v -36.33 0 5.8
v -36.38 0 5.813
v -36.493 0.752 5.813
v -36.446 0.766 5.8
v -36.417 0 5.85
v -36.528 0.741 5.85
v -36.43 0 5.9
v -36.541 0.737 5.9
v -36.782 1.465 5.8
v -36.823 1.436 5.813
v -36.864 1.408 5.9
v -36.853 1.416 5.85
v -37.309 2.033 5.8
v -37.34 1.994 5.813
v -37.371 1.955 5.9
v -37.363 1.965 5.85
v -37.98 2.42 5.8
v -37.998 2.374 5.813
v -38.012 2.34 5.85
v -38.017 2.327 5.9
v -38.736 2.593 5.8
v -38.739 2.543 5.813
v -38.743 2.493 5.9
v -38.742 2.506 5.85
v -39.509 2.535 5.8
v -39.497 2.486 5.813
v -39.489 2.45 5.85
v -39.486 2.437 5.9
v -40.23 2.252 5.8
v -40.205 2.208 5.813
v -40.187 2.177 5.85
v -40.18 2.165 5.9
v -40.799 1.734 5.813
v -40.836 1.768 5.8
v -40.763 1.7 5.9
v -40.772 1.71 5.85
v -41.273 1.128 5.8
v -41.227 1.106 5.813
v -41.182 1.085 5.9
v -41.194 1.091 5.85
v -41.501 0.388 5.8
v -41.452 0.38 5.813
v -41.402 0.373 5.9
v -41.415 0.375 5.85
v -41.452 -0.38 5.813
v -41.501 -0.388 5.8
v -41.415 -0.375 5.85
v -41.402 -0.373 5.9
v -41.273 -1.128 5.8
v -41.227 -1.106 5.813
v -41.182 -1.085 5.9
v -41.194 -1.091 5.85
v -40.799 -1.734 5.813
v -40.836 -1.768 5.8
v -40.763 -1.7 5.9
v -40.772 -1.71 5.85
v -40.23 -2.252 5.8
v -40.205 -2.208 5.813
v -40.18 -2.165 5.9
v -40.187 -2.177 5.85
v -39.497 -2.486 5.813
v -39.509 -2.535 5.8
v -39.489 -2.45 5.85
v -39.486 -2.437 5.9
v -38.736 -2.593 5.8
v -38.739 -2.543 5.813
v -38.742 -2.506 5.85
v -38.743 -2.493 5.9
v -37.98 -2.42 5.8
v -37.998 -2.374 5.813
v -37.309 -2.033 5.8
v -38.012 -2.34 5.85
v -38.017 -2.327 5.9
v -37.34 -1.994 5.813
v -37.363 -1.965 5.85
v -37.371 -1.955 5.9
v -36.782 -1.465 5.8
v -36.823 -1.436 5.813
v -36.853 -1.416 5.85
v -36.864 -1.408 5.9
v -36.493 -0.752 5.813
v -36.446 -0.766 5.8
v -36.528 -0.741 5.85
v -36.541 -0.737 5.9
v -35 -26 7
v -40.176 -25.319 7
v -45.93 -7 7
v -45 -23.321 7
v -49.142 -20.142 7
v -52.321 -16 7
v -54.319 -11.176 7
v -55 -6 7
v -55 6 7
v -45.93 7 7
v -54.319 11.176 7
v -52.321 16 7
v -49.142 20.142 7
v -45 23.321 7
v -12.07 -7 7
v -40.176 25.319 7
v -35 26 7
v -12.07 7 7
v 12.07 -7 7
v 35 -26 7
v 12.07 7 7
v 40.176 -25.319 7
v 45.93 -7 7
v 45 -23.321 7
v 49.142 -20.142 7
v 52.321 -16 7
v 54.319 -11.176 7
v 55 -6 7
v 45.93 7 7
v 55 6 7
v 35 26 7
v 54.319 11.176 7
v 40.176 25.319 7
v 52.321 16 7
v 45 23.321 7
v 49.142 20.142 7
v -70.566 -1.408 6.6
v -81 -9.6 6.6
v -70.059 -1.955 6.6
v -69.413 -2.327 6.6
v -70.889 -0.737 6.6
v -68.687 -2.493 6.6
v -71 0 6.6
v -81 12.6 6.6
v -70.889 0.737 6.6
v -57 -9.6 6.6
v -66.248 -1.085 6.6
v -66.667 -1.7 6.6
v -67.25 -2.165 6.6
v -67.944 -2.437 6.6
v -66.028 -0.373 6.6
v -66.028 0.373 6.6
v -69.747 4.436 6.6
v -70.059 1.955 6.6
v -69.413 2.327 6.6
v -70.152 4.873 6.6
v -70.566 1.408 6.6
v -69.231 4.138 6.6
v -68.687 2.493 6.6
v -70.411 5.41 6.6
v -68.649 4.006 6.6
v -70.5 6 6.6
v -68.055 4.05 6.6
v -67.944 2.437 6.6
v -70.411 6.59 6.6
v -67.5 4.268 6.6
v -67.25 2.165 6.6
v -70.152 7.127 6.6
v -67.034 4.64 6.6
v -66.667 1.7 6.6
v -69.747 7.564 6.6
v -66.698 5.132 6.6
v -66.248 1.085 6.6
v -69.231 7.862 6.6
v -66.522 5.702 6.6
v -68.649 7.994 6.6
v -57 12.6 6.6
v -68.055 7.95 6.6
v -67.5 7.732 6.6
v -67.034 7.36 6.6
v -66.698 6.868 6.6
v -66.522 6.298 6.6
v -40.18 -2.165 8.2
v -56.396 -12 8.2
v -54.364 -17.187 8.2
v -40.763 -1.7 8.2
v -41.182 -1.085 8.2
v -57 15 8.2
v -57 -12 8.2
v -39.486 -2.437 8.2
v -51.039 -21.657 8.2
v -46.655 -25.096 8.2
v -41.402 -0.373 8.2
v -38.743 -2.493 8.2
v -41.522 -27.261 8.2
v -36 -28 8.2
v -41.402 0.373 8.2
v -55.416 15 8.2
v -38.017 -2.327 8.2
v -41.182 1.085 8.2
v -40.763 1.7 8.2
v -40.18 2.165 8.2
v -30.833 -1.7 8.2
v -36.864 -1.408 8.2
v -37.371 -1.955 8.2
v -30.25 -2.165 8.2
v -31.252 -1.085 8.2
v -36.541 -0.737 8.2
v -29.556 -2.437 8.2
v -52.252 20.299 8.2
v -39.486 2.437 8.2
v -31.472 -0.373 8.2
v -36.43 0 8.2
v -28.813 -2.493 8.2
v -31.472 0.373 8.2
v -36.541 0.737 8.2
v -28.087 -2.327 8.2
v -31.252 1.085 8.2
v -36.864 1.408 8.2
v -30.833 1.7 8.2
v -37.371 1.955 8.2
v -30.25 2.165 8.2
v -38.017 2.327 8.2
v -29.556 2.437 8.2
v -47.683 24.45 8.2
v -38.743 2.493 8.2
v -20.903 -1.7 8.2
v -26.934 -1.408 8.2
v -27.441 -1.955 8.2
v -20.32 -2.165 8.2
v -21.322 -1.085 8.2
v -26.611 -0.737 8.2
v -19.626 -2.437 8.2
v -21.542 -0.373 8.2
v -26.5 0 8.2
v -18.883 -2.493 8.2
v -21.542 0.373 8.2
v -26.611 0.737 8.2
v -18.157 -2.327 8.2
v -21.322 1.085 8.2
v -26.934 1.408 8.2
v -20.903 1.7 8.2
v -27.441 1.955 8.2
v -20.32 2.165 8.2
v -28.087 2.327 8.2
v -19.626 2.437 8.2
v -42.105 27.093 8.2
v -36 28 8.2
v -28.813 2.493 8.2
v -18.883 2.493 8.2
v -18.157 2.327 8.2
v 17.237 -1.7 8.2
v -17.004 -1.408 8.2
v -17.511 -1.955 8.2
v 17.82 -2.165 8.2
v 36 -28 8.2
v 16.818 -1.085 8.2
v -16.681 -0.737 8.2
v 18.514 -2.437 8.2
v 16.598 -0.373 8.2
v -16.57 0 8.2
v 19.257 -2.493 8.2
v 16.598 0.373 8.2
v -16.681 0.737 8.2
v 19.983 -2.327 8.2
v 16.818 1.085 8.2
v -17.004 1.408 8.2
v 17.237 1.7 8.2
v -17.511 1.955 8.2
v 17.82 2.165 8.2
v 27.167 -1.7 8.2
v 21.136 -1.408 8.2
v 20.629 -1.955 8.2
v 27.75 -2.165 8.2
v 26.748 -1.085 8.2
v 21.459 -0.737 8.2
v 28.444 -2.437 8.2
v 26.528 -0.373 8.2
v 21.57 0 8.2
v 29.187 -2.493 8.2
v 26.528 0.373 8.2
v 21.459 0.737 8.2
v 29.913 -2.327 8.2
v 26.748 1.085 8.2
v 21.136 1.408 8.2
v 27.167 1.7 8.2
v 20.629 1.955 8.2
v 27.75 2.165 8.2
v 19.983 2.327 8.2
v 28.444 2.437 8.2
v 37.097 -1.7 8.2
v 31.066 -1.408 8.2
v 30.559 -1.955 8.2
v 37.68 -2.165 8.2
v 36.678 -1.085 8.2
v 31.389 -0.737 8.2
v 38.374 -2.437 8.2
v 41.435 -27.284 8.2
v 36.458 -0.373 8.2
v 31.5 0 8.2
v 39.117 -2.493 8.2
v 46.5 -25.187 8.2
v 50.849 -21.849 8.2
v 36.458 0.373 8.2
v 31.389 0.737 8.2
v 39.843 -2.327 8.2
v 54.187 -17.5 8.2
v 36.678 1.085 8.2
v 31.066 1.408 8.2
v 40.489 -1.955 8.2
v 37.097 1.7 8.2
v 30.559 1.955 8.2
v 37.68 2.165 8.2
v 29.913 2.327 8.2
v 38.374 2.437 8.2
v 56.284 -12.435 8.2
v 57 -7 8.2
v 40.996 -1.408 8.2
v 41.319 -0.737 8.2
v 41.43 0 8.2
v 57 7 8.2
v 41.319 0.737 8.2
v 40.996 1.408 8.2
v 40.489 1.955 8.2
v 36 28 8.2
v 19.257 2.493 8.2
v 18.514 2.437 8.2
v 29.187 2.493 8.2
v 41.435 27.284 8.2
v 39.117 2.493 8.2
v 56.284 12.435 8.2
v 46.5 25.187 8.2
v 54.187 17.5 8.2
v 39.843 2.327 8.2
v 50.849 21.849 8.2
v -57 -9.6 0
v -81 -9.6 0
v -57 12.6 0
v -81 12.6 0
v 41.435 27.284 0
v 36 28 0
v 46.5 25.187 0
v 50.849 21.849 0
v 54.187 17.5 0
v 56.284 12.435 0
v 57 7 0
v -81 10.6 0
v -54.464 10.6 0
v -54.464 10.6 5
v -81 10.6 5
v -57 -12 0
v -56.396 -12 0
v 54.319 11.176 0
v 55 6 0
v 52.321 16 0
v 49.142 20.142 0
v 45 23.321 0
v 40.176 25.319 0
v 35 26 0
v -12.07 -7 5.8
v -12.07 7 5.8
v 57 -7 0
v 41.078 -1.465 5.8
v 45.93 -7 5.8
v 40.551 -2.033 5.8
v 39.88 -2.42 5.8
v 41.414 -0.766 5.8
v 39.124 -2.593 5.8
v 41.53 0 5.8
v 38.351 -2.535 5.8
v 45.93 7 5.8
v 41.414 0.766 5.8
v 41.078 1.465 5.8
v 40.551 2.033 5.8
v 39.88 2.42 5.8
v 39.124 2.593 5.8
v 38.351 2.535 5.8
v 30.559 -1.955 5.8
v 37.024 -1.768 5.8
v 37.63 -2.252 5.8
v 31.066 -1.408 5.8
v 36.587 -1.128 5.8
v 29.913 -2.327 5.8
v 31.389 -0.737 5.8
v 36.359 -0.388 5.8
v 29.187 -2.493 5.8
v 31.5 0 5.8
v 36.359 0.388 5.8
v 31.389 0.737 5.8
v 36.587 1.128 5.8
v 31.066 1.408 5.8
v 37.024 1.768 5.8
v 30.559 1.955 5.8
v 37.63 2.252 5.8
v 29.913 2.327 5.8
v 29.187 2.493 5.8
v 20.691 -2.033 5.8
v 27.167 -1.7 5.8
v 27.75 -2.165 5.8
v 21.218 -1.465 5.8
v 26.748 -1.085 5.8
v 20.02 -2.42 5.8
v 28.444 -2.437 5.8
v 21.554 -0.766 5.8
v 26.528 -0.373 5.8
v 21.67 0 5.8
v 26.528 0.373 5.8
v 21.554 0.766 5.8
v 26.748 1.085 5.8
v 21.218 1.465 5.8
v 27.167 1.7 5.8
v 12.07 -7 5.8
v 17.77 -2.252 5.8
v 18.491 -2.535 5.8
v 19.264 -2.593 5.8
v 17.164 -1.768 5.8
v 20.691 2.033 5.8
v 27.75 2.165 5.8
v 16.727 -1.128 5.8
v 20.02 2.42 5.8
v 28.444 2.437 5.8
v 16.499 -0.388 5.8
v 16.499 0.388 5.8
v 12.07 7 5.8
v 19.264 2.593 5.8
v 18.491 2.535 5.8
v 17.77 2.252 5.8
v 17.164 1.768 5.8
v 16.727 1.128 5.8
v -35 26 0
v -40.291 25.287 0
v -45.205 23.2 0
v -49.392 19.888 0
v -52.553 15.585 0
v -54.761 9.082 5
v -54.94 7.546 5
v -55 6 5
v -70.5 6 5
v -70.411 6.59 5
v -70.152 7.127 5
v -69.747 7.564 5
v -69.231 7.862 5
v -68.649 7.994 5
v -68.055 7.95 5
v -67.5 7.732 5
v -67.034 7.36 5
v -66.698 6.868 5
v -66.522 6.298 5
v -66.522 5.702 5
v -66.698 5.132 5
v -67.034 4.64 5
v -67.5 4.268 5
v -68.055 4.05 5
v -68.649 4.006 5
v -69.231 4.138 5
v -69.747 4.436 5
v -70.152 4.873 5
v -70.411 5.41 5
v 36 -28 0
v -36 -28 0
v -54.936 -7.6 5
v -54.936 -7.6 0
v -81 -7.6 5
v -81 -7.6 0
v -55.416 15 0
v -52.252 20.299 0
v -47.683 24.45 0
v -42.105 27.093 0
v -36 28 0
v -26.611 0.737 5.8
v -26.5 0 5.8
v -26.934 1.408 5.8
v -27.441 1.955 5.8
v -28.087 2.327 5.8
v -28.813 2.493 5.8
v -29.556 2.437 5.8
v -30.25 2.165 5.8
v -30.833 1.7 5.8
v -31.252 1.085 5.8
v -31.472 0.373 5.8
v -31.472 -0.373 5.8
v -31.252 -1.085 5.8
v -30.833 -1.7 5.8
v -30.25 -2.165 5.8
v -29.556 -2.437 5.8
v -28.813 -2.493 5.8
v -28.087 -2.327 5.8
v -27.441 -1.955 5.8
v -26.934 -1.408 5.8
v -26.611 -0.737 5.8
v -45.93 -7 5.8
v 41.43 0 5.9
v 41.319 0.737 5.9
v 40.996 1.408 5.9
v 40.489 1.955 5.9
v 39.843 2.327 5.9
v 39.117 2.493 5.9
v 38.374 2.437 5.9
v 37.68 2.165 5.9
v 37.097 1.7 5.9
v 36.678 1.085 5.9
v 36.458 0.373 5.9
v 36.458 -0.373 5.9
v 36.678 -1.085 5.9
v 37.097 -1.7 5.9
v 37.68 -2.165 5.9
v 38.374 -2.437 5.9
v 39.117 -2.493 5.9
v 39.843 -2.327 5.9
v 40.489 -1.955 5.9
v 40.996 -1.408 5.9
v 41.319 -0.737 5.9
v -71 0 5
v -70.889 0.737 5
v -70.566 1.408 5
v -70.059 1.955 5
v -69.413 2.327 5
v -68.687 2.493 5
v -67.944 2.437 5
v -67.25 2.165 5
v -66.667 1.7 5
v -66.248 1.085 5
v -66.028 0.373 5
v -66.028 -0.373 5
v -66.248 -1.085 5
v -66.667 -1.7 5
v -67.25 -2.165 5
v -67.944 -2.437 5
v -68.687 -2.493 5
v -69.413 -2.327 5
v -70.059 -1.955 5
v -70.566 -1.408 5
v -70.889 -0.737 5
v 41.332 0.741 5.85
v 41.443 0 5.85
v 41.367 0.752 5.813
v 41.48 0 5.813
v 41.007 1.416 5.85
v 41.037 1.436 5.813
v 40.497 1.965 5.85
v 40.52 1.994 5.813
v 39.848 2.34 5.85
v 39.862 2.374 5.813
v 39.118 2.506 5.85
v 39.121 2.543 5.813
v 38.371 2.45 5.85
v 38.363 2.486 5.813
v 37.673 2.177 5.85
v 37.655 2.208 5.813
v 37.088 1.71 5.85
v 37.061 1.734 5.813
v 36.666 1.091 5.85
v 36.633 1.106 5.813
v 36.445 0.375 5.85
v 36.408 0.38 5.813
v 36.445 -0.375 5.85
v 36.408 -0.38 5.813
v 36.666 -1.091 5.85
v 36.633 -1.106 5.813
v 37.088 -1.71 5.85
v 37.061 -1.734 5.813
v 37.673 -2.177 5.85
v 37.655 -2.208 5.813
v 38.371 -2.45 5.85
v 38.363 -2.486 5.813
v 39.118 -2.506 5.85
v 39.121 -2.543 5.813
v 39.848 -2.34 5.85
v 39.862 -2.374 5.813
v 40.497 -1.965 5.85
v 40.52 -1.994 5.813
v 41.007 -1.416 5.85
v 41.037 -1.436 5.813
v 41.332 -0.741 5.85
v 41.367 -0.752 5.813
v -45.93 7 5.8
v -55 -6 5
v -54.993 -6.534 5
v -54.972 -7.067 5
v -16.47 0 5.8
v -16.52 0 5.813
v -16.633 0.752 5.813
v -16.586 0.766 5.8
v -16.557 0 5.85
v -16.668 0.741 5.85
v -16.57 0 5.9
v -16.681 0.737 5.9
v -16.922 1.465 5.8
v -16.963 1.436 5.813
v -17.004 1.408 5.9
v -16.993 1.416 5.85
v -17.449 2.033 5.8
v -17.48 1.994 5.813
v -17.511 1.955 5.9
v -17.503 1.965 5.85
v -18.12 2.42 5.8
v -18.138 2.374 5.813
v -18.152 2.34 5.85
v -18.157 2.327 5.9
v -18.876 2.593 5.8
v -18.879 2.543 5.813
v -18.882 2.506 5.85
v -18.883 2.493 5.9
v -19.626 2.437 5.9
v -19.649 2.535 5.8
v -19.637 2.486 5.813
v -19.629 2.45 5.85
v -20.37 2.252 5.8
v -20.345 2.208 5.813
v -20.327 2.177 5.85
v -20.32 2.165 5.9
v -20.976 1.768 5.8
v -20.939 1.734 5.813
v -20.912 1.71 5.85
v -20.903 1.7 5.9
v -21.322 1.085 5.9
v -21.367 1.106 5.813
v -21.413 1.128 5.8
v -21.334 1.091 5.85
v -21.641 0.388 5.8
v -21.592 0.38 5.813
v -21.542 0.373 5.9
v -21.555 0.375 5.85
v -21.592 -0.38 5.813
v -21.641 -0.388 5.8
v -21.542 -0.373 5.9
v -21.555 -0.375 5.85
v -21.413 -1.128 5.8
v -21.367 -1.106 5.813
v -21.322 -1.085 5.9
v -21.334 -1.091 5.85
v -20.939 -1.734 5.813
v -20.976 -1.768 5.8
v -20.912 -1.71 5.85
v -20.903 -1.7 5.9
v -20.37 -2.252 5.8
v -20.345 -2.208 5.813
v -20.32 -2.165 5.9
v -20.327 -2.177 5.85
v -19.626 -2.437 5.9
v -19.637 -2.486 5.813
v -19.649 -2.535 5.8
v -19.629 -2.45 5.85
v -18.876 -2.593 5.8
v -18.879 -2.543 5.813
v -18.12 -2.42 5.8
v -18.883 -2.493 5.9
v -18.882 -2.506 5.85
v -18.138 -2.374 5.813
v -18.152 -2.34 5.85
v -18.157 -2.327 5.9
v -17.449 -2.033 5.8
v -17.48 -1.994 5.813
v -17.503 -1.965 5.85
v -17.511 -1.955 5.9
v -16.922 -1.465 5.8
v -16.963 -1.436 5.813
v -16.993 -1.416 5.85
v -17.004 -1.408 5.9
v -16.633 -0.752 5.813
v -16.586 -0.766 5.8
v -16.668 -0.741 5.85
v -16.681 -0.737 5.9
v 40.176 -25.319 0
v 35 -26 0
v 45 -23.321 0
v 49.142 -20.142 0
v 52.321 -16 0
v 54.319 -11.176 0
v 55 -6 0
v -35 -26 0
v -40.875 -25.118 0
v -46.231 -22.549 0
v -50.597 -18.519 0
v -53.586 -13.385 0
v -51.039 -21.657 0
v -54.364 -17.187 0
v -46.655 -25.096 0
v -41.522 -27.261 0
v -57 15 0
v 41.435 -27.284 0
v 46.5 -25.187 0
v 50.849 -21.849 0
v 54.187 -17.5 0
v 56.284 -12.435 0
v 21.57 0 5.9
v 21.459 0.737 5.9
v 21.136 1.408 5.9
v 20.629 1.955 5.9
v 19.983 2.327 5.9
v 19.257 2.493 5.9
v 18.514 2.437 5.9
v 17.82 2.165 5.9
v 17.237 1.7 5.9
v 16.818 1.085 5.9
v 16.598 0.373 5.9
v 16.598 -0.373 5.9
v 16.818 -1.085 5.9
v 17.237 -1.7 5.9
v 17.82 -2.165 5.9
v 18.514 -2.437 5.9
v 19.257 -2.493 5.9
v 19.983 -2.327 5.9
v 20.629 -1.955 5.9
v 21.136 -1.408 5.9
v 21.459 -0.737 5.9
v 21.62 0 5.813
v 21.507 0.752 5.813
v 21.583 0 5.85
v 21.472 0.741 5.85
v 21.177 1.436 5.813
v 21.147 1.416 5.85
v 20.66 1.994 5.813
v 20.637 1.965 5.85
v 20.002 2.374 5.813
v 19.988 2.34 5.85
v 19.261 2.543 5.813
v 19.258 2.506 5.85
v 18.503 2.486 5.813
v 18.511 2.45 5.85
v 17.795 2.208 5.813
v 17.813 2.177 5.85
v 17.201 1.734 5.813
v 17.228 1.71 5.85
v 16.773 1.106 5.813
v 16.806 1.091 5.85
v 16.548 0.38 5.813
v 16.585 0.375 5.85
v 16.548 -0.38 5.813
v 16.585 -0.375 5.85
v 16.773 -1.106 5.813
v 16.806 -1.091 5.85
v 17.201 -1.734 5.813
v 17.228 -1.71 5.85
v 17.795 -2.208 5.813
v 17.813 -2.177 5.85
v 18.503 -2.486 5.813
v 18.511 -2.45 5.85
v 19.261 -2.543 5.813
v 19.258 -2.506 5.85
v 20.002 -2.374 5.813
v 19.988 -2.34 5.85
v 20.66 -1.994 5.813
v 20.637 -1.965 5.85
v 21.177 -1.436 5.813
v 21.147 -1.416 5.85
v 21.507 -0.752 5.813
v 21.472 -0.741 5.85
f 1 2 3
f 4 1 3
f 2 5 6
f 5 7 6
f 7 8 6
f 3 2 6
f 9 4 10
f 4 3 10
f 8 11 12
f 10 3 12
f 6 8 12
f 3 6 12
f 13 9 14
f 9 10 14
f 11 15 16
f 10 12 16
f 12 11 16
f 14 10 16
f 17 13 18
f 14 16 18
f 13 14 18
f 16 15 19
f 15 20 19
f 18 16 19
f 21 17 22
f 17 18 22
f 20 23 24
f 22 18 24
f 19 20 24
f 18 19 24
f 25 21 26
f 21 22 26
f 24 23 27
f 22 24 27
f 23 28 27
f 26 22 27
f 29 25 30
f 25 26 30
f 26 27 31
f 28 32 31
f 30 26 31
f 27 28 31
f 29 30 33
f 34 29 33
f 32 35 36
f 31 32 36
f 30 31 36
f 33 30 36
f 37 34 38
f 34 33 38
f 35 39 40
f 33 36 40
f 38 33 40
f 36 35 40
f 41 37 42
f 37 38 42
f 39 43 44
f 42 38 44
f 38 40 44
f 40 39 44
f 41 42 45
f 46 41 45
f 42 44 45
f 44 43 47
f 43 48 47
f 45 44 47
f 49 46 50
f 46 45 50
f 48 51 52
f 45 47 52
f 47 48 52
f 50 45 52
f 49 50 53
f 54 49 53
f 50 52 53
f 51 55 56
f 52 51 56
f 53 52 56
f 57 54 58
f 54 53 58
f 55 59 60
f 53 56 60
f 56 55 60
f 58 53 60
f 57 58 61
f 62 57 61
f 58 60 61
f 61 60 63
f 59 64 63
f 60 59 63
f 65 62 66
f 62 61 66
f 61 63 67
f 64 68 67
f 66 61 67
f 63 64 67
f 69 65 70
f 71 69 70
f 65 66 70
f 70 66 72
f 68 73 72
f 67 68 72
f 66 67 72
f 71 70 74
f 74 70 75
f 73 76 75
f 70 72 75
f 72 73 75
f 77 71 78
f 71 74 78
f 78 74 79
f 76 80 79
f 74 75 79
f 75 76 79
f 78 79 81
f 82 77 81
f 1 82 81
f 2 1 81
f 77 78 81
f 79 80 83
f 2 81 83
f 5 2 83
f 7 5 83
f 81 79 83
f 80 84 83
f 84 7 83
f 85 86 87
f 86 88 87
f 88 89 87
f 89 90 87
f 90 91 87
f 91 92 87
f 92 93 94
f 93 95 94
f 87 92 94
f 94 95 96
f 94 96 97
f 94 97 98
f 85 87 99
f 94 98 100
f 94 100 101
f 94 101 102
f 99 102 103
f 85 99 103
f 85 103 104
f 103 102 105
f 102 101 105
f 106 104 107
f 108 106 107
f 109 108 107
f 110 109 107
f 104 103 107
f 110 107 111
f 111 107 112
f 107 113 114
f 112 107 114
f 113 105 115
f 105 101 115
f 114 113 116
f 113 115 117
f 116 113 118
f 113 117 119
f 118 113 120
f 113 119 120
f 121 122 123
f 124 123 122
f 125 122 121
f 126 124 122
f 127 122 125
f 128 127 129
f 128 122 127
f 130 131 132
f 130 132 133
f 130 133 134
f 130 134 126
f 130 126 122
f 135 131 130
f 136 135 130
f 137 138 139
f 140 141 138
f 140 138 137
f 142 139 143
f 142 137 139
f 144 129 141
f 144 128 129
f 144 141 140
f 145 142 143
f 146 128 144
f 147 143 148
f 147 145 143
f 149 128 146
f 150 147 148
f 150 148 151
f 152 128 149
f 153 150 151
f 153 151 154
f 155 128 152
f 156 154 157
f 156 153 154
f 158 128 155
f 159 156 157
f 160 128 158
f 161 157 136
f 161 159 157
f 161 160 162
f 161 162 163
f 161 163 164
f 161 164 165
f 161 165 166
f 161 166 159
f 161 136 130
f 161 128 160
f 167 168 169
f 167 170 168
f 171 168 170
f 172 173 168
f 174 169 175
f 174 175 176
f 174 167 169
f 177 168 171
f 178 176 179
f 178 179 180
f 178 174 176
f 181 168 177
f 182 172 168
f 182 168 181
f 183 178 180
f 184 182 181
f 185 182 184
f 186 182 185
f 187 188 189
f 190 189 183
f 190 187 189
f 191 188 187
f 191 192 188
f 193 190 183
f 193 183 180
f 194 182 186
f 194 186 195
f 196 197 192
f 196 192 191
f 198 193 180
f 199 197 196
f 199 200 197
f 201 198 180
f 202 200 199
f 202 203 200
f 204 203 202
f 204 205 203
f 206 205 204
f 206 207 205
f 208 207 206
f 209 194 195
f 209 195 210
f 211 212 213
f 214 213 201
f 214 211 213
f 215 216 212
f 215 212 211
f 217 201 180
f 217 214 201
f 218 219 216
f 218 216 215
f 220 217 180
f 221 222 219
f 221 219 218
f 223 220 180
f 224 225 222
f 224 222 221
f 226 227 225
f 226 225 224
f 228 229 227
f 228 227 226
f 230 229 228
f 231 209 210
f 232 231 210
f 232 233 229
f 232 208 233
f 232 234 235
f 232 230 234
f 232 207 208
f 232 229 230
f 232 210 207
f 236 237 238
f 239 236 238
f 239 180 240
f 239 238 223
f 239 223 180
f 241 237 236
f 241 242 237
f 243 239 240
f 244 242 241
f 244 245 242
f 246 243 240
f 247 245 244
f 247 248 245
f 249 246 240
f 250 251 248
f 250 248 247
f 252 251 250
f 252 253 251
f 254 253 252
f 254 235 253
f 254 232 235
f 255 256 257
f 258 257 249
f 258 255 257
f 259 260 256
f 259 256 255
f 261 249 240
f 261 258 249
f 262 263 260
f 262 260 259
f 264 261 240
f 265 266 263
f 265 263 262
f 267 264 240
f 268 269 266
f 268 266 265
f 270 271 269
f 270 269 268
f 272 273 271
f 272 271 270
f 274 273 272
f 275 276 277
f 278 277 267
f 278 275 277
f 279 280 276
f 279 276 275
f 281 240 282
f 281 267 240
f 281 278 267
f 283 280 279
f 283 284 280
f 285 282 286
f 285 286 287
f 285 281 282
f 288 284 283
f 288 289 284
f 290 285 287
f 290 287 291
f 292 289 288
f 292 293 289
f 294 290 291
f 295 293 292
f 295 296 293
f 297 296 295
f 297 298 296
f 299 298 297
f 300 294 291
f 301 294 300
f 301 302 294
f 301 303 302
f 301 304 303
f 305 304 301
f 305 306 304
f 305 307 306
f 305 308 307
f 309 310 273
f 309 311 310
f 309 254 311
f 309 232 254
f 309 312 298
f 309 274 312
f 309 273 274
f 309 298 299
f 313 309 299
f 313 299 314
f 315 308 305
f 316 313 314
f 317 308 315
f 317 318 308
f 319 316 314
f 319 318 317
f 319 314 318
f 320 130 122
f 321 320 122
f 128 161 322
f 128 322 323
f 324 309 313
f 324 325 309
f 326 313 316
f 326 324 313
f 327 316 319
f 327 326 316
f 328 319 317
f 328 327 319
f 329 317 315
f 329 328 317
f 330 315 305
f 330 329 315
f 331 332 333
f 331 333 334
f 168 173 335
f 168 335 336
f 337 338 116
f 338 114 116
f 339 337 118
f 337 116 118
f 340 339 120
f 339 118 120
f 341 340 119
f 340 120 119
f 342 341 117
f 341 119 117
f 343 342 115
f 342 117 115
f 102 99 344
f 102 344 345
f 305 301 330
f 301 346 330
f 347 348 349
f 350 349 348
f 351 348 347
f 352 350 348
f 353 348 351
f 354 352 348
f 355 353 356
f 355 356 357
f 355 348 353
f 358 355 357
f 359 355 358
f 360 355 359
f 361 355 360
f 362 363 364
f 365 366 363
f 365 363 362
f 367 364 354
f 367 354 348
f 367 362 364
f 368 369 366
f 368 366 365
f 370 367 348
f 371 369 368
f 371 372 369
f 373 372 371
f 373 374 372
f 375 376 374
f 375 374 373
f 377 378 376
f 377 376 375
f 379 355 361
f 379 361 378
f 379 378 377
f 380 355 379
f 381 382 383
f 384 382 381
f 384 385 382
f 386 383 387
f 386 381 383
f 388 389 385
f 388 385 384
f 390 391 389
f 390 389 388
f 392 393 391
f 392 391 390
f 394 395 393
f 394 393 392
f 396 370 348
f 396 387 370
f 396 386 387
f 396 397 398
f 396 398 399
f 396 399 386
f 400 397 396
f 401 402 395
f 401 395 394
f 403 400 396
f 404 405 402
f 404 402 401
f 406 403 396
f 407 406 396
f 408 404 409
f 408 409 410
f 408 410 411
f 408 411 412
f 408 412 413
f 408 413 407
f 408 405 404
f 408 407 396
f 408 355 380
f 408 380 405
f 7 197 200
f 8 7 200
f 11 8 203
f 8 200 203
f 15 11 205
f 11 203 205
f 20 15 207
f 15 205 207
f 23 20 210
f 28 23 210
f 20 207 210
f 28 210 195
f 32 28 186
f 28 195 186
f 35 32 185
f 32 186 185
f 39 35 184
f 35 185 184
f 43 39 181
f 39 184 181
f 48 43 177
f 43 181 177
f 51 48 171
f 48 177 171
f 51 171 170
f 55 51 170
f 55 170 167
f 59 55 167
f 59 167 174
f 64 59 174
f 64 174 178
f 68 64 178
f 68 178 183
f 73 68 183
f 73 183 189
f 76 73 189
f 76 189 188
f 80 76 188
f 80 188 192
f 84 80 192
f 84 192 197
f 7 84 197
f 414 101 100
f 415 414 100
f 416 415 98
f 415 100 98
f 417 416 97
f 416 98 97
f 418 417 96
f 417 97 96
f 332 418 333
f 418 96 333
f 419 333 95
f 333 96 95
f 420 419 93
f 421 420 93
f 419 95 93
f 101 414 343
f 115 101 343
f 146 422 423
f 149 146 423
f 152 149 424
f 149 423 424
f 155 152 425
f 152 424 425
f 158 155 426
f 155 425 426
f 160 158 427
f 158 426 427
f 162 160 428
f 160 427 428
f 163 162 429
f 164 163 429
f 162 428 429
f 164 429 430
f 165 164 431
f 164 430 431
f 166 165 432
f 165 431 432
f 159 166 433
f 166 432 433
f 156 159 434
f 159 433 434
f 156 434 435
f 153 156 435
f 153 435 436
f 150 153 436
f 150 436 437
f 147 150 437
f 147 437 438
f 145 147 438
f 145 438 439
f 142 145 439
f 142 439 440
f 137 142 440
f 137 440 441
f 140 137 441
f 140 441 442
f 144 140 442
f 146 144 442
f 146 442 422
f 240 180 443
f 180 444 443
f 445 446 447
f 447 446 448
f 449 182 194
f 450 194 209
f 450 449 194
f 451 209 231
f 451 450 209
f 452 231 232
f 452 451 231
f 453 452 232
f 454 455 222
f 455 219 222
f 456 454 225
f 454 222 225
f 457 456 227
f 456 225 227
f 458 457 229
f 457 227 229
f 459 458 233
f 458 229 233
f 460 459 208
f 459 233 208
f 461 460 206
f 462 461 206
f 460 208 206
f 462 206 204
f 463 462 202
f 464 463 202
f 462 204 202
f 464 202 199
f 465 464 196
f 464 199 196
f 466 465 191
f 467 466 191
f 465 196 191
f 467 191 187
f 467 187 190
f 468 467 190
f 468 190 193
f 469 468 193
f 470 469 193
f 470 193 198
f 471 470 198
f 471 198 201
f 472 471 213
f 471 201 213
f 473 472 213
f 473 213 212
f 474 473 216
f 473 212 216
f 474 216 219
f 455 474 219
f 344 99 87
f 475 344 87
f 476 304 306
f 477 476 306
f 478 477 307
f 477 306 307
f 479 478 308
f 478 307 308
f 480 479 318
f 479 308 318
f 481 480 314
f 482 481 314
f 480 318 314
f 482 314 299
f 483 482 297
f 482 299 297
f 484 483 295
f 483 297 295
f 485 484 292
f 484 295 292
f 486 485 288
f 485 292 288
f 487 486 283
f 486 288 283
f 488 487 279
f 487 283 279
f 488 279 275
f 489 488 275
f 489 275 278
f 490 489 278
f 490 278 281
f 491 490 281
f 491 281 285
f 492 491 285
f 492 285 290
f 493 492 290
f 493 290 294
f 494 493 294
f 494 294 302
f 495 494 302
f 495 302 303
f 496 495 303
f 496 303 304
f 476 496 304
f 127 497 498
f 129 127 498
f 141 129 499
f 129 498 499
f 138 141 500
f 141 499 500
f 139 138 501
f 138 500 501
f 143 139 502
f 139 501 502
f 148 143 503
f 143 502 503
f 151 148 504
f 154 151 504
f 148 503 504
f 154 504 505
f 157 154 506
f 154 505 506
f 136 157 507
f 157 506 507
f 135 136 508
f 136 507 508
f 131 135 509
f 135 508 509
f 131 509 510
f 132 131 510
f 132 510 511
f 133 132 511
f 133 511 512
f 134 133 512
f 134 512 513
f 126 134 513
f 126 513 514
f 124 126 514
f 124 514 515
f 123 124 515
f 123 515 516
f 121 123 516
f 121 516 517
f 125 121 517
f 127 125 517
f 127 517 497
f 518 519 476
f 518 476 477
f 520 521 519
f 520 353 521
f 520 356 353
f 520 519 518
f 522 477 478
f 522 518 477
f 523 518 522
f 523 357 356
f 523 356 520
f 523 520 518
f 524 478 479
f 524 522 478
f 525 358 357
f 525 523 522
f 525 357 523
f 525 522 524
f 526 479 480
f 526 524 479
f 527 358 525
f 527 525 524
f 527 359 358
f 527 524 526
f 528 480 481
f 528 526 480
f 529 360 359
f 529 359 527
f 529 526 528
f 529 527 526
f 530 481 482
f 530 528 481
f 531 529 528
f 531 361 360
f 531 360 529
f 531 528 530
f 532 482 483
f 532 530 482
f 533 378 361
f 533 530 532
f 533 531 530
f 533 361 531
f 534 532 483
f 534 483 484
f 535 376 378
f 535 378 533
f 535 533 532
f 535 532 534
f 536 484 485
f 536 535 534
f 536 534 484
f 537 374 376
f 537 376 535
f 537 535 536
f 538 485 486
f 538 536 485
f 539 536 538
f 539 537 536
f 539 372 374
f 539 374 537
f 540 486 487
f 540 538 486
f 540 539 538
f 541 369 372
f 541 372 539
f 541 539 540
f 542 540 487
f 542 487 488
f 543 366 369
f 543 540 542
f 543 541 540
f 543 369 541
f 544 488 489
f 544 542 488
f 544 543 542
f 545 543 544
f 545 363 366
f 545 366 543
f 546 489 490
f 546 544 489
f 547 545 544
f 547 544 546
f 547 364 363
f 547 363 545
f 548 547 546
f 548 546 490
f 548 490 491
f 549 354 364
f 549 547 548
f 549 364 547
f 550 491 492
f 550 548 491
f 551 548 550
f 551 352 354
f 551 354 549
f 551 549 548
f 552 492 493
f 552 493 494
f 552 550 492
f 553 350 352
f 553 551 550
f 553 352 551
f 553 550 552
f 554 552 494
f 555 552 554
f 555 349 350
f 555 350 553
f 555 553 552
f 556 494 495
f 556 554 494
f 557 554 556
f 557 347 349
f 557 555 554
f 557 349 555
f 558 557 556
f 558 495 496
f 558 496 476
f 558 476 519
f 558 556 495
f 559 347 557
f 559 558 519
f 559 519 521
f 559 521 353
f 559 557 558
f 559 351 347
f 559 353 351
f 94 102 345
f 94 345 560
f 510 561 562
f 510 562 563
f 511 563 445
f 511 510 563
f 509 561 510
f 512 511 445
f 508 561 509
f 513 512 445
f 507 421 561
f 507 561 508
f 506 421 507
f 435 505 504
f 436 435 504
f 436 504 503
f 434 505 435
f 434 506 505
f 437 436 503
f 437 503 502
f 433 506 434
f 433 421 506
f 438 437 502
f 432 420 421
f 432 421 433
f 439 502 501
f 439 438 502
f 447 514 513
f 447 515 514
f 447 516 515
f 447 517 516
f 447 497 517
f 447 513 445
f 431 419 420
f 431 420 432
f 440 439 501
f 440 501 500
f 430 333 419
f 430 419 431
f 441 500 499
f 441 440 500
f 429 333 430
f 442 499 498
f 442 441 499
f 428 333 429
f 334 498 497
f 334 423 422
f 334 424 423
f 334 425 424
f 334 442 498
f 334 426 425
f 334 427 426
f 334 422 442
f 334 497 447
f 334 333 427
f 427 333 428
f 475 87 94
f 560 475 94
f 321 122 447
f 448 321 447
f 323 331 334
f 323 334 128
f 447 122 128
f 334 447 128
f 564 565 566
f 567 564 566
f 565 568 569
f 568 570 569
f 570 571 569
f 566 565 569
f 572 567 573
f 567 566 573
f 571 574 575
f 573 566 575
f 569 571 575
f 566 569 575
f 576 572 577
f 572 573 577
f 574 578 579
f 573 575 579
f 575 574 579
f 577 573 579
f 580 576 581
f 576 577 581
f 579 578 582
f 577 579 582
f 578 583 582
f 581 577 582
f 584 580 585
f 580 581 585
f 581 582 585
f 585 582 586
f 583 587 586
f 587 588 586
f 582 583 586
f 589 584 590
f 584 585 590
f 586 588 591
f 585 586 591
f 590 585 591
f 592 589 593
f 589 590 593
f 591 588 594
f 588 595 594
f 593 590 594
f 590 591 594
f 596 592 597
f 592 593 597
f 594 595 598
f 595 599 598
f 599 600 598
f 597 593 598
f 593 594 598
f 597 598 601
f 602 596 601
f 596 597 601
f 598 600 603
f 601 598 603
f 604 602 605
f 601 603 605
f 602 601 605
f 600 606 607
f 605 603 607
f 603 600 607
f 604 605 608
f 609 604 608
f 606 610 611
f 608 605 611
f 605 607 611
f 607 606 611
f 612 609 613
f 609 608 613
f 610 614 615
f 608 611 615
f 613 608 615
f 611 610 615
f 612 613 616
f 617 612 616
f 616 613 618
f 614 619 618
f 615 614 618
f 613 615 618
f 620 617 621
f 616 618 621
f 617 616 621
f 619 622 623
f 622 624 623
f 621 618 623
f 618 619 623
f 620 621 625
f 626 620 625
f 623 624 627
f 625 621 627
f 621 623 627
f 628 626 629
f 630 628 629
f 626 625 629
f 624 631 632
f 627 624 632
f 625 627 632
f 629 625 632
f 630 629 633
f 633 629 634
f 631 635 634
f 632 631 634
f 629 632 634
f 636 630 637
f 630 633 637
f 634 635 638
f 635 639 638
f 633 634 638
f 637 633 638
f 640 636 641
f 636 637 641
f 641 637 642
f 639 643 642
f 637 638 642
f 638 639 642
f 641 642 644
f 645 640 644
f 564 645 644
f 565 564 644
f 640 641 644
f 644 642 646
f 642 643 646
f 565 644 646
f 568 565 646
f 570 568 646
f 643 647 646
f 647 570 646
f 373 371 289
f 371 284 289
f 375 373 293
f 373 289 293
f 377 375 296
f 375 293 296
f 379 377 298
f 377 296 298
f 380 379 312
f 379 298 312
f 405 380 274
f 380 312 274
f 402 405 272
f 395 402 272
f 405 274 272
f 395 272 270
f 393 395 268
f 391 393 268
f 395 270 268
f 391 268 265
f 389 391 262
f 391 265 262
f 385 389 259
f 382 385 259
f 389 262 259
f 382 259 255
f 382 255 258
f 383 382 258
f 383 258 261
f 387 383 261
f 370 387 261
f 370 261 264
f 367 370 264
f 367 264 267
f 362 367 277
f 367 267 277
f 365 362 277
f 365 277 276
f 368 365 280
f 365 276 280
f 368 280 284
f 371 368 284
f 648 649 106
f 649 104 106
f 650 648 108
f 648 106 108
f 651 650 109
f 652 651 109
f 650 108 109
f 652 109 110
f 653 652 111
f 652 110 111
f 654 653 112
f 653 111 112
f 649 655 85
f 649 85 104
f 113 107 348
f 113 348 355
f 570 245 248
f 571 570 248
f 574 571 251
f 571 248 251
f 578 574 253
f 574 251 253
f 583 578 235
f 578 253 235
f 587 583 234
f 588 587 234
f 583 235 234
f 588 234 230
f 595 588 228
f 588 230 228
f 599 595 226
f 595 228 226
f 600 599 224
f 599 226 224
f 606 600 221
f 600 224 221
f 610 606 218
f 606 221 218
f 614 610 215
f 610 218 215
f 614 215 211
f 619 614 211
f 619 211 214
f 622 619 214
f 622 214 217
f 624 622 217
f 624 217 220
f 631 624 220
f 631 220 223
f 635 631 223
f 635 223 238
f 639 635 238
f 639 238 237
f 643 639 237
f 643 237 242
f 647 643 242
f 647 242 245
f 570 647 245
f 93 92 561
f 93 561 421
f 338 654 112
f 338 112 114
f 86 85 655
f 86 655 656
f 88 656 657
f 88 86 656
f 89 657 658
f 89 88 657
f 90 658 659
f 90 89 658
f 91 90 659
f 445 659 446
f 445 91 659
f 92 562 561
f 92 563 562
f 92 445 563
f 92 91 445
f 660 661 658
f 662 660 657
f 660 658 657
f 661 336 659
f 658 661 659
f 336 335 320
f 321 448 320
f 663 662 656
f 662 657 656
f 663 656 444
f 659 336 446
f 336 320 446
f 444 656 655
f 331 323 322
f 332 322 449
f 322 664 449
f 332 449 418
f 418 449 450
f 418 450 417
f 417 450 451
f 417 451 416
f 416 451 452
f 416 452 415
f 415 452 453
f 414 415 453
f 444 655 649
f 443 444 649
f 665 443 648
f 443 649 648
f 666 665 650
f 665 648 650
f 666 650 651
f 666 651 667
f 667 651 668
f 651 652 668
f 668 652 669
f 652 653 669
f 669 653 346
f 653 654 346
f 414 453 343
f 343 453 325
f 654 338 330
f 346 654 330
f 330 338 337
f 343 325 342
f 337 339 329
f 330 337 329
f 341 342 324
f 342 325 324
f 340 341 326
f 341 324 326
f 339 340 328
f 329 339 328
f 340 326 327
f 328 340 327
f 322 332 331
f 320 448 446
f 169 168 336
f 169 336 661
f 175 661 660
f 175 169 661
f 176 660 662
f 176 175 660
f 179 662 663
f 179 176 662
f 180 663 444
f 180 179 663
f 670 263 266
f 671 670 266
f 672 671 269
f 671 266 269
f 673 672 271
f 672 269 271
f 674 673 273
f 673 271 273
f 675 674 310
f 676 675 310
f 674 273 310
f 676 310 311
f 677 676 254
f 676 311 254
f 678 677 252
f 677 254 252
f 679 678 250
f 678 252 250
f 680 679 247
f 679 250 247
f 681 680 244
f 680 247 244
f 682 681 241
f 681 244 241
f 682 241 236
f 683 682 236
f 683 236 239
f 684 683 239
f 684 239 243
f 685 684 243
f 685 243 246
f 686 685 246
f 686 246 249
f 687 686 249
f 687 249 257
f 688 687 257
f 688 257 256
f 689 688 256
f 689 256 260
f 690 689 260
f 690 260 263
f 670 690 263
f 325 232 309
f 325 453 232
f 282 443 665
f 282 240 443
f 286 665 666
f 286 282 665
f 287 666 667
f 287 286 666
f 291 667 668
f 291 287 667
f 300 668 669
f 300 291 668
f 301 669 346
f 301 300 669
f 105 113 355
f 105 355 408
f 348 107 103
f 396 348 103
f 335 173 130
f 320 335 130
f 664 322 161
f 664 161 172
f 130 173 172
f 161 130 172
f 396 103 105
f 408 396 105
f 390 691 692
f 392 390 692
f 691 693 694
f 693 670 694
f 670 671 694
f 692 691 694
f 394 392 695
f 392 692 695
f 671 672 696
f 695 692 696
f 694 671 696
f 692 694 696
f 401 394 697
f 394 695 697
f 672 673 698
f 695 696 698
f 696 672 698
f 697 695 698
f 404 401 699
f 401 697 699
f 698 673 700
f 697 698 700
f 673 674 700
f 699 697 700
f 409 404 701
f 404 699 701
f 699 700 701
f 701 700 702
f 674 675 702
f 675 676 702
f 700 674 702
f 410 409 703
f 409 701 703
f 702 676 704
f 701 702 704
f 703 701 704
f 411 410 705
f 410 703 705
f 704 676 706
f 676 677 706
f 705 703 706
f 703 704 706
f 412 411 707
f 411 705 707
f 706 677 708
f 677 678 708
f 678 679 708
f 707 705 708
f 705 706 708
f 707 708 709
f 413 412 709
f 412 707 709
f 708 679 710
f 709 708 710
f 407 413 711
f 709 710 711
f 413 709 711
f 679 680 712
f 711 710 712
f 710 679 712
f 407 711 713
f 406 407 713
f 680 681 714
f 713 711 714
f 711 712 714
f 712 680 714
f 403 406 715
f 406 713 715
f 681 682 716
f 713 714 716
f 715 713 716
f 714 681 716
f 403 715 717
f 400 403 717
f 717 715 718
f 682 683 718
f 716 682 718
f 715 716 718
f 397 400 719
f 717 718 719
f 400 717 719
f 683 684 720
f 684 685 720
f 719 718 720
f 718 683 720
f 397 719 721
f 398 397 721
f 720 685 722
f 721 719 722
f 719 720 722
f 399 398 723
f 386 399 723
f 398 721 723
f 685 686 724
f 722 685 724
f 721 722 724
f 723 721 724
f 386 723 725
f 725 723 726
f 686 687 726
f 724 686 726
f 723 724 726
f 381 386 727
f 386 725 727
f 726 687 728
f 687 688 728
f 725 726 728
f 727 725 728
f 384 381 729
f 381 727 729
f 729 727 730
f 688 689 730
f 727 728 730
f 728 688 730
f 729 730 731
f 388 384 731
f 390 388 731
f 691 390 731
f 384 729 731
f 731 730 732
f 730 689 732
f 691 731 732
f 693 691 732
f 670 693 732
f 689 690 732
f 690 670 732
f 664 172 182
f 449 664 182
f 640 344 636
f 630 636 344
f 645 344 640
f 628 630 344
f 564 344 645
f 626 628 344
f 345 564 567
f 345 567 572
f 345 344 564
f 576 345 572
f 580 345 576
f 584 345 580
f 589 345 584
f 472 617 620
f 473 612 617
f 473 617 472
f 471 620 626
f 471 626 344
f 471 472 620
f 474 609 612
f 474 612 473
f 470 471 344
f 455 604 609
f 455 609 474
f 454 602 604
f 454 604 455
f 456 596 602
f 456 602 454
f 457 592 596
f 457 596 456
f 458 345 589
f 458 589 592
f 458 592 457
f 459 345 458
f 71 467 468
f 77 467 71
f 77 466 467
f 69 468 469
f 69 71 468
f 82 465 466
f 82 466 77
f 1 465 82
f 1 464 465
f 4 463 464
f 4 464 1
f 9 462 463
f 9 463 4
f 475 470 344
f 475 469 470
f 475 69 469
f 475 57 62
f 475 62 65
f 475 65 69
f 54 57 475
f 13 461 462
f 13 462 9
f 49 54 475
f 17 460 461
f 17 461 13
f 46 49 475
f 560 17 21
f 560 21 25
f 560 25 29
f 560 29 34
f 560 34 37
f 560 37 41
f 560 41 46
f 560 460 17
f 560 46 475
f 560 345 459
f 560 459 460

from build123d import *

# Parameters (mm, degrees)
SKETCH_1_W          = 114
SKETCH_1_H          = 56
SKETCH_1_W_2        = 110
SKETCH_1_H_2        = 52
EXTRUDE_1_DEPTH     = 7
SKETCH_2_W          = 114
SKETCH_2_H          = 56
EXTRUDE_1_2_DEPTH   = 1.2
SKETCH_3_R          = 2.5
CUT_EXTRUDE_1_DEPTH = 1.2
FILLET_1_R          = 20
FILLET_2_R          = 21
SKETCH_4_W          = 33.86
SKETCH_4_H          = 14
EXTRUDE_2_DEPTH     = 1.2
SKETCH_5_R          = 2.5
CUT_EXTRUDE_2_DEPTH = 1.2
FILLET_3_R          = 0.1
SKETCH_14_W         = 26
SKETCH_14_H         = 22.2
EXTRUDE_5_DEPTH     = 7
SKETCH_15_W         = 28
SKETCH_15_H         = 18.2
CUT_EXTRUDE_3_DEPTH = 5
SKETCH_18_W         = 2
SKETCH_18_H         = 27
EXTRUDE_6_DEPTH     = 8.2
SKETCH_19_W         = 2
SKETCH_19_H         = 18.2
CUT_EXTRUDE_4_DEPTH = 5
SKETCH_20_R         = 2.5
SKETCH_20_R_2       = 2
CUT_EXTRUDE_5_DEPTH = 5
SKETCH_21_W         = 24
SKETCH_21_H         = 22.2
CUT_EXTRUDE_6_DEPTH = 0.4


with BuildPart() as part:
    # Эскиз1 → Extrude 1 (new body)
    with BuildSketch(Plane.XY):
        Rectangle(SKETCH_1_W, SKETCH_1_H)
        Rectangle(SKETCH_1_W_2, SKETCH_1_H_2, mode=Mode.SUBTRACT)
    extrude(amount=EXTRUDE_1_DEPTH)

    # Эскиз2 → Extrude 1 2 (add)
    with BuildSketch(Plane.XY.offset(7)):
        Rectangle(SKETCH_2_W, SKETCH_2_H)
    extrude(amount=EXTRUDE_1_2_DEPTH)

    # Эскиз3 → Вырез-Вытянуть1 (cut)
    with BuildSketch(Plane.XY.offset(8.2)):
        with Locations((-38.93, 0)):
            Circle(SKETCH_3_R)
        with Locations((-29, 0)):
            Circle(SKETCH_3_R)
        with Locations((-19.07, 0)):
            Circle(SKETCH_3_R)
        with Locations((19.07, 0)):
            Circle(SKETCH_3_R)
        with Locations((29, 0)):
            Circle(SKETCH_3_R)
        with Locations((38.93, 0)):
            Circle(SKETCH_3_R)
    extrude(amount=-CUT_EXTRUDE_1_DEPTH, mode=Mode.SUBTRACT)

    # Скругление1
    fillet_1_edges = [part.edges().sort_by_distance(p)[0] for p in [
        (-55, 26, 3.5),
        (-55, -26, 3.5),
        (55, -26, 3.5),
        (55, 26, 3.5),
    ]]
    fillet(fillet_1_edges, radius=FILLET_1_R)

    # Скругление2
    fillet_2_edges = [part.edges().sort_by_distance(p)[0] for p in [
        (-57, 28, 4.1),
        (57, 28, 4.1),
        (57, -28, 4.1),
        (-57, -28, 4.1),
    ]]
    fillet(fillet_2_edges, radius=FILLET_2_R)

    # Эскиз4 → Бобышка-Вытянуть2 (add)
    with BuildSketch(Plane(origin=(0, 0, 7), x_dir=(-1, 0, 0), z_dir=(0, 0, -1))):
        with Locations((29, 0)):
            Rectangle(SKETCH_4_W, SKETCH_4_H)
        with Locations((-29, 0)):
            Rectangle(SKETCH_4_W, SKETCH_4_H)
    extrude(amount=EXTRUDE_2_DEPTH)

    # Эскиз5 → Вырез-Вытянуть2 (cut)
    with BuildSketch(Plane.XY.offset(7)):
        with Locations((-29, 0)):
            Circle(SKETCH_5_R)
        with Locations((-38.93, 0)):
            Circle(SKETCH_5_R)
        with Locations((-19.07, 0)):
            Circle(SKETCH_5_R)
        with Locations((19.07, 0)):
            Circle(SKETCH_5_R)
        with Locations((29, 0)):
            Circle(SKETCH_5_R)
        with Locations((38.93, 0)):
            Circle(SKETCH_5_R)
    extrude(amount=-CUT_EXTRUDE_2_DEPTH, mode=Mode.SUBTRACT)

    # Скругление3
    fillet_3_edges = [part.edges().sort_by_distance(p)[0] for p in [
        (36.43, 0, 5.8),
        (16.57, 0, 5.8),
        (-21.57, 0, 5.8),
        (-41.43, 0, 5.8),
    ]]
    fillet(fillet_3_edges, radius=FILLET_3_R)

    # Эскиз14 → Бобышка-Вытянуть5 (add)
    with BuildSketch(Plane(origin=(0, 0, 7), x_dir=(-1, 0, 0), z_dir=(0, 0, -1))):
        with Locations((68, 1.5)):
            Rectangle(SKETCH_14_W, SKETCH_14_H)
    extrude(amount=EXTRUDE_5_DEPTH)

    # Эскиз15 → Вырез-Вытянуть3 (cut)
    with BuildSketch(Plane(origin=(0, 0, 0), x_dir=(-1, 0, 0), z_dir=(0, 0, -1))):
        with Locations((67, 1.5)):
            Rectangle(SKETCH_15_W, SKETCH_15_H)
    extrude(amount=-CUT_EXTRUDE_3_DEPTH, mode=Mode.SUBTRACT)

    # Эскиз18 → Бобышка-Вытянуть6 (add)
    with BuildSketch(Plane.XY.offset(8.2)):
        with Locations((-56, 1.5)):
            Rectangle(SKETCH_18_W, SKETCH_18_H)
    extrude(amount=-EXTRUDE_6_DEPTH)

    # Эскиз19 → Вырез-Вытянуть4 (cut)
    with BuildSketch(Plane(origin=(0, 0, 0), x_dir=(-1, 0, 0), z_dir=(0, 0, -1))):
        with Locations((56, 1.5)):
            Rectangle(SKETCH_19_W, SKETCH_19_H)
    extrude(amount=-CUT_EXTRUDE_4_DEPTH, mode=Mode.SUBTRACT)

    # Эскиз20 → Вырез-Вытянуть5 (cut)
    with BuildSketch(Plane(origin=(0, 0, 5), x_dir=(-1, 0, 0), z_dir=(0, 0, -1))):
        with Locations((68.5, 0)):
            Circle(SKETCH_20_R)
        with Locations((68.5, 6)):
            Circle(SKETCH_20_R_2)
    extrude(amount=-CUT_EXTRUDE_5_DEPTH, mode=Mode.SUBTRACT)

    # Эскиз21 → Вырез-Вытянуть6 (cut)
    with BuildSketch(Plane.XY.offset(7)):
        with Locations((-69, 1.5)):
            Rectangle(SKETCH_21_W, SKETCH_21_H)
    extrude(amount=-CUT_EXTRUDE_6_DEPTH, mode=Mode.SUBTRACT)


solid = part.part
